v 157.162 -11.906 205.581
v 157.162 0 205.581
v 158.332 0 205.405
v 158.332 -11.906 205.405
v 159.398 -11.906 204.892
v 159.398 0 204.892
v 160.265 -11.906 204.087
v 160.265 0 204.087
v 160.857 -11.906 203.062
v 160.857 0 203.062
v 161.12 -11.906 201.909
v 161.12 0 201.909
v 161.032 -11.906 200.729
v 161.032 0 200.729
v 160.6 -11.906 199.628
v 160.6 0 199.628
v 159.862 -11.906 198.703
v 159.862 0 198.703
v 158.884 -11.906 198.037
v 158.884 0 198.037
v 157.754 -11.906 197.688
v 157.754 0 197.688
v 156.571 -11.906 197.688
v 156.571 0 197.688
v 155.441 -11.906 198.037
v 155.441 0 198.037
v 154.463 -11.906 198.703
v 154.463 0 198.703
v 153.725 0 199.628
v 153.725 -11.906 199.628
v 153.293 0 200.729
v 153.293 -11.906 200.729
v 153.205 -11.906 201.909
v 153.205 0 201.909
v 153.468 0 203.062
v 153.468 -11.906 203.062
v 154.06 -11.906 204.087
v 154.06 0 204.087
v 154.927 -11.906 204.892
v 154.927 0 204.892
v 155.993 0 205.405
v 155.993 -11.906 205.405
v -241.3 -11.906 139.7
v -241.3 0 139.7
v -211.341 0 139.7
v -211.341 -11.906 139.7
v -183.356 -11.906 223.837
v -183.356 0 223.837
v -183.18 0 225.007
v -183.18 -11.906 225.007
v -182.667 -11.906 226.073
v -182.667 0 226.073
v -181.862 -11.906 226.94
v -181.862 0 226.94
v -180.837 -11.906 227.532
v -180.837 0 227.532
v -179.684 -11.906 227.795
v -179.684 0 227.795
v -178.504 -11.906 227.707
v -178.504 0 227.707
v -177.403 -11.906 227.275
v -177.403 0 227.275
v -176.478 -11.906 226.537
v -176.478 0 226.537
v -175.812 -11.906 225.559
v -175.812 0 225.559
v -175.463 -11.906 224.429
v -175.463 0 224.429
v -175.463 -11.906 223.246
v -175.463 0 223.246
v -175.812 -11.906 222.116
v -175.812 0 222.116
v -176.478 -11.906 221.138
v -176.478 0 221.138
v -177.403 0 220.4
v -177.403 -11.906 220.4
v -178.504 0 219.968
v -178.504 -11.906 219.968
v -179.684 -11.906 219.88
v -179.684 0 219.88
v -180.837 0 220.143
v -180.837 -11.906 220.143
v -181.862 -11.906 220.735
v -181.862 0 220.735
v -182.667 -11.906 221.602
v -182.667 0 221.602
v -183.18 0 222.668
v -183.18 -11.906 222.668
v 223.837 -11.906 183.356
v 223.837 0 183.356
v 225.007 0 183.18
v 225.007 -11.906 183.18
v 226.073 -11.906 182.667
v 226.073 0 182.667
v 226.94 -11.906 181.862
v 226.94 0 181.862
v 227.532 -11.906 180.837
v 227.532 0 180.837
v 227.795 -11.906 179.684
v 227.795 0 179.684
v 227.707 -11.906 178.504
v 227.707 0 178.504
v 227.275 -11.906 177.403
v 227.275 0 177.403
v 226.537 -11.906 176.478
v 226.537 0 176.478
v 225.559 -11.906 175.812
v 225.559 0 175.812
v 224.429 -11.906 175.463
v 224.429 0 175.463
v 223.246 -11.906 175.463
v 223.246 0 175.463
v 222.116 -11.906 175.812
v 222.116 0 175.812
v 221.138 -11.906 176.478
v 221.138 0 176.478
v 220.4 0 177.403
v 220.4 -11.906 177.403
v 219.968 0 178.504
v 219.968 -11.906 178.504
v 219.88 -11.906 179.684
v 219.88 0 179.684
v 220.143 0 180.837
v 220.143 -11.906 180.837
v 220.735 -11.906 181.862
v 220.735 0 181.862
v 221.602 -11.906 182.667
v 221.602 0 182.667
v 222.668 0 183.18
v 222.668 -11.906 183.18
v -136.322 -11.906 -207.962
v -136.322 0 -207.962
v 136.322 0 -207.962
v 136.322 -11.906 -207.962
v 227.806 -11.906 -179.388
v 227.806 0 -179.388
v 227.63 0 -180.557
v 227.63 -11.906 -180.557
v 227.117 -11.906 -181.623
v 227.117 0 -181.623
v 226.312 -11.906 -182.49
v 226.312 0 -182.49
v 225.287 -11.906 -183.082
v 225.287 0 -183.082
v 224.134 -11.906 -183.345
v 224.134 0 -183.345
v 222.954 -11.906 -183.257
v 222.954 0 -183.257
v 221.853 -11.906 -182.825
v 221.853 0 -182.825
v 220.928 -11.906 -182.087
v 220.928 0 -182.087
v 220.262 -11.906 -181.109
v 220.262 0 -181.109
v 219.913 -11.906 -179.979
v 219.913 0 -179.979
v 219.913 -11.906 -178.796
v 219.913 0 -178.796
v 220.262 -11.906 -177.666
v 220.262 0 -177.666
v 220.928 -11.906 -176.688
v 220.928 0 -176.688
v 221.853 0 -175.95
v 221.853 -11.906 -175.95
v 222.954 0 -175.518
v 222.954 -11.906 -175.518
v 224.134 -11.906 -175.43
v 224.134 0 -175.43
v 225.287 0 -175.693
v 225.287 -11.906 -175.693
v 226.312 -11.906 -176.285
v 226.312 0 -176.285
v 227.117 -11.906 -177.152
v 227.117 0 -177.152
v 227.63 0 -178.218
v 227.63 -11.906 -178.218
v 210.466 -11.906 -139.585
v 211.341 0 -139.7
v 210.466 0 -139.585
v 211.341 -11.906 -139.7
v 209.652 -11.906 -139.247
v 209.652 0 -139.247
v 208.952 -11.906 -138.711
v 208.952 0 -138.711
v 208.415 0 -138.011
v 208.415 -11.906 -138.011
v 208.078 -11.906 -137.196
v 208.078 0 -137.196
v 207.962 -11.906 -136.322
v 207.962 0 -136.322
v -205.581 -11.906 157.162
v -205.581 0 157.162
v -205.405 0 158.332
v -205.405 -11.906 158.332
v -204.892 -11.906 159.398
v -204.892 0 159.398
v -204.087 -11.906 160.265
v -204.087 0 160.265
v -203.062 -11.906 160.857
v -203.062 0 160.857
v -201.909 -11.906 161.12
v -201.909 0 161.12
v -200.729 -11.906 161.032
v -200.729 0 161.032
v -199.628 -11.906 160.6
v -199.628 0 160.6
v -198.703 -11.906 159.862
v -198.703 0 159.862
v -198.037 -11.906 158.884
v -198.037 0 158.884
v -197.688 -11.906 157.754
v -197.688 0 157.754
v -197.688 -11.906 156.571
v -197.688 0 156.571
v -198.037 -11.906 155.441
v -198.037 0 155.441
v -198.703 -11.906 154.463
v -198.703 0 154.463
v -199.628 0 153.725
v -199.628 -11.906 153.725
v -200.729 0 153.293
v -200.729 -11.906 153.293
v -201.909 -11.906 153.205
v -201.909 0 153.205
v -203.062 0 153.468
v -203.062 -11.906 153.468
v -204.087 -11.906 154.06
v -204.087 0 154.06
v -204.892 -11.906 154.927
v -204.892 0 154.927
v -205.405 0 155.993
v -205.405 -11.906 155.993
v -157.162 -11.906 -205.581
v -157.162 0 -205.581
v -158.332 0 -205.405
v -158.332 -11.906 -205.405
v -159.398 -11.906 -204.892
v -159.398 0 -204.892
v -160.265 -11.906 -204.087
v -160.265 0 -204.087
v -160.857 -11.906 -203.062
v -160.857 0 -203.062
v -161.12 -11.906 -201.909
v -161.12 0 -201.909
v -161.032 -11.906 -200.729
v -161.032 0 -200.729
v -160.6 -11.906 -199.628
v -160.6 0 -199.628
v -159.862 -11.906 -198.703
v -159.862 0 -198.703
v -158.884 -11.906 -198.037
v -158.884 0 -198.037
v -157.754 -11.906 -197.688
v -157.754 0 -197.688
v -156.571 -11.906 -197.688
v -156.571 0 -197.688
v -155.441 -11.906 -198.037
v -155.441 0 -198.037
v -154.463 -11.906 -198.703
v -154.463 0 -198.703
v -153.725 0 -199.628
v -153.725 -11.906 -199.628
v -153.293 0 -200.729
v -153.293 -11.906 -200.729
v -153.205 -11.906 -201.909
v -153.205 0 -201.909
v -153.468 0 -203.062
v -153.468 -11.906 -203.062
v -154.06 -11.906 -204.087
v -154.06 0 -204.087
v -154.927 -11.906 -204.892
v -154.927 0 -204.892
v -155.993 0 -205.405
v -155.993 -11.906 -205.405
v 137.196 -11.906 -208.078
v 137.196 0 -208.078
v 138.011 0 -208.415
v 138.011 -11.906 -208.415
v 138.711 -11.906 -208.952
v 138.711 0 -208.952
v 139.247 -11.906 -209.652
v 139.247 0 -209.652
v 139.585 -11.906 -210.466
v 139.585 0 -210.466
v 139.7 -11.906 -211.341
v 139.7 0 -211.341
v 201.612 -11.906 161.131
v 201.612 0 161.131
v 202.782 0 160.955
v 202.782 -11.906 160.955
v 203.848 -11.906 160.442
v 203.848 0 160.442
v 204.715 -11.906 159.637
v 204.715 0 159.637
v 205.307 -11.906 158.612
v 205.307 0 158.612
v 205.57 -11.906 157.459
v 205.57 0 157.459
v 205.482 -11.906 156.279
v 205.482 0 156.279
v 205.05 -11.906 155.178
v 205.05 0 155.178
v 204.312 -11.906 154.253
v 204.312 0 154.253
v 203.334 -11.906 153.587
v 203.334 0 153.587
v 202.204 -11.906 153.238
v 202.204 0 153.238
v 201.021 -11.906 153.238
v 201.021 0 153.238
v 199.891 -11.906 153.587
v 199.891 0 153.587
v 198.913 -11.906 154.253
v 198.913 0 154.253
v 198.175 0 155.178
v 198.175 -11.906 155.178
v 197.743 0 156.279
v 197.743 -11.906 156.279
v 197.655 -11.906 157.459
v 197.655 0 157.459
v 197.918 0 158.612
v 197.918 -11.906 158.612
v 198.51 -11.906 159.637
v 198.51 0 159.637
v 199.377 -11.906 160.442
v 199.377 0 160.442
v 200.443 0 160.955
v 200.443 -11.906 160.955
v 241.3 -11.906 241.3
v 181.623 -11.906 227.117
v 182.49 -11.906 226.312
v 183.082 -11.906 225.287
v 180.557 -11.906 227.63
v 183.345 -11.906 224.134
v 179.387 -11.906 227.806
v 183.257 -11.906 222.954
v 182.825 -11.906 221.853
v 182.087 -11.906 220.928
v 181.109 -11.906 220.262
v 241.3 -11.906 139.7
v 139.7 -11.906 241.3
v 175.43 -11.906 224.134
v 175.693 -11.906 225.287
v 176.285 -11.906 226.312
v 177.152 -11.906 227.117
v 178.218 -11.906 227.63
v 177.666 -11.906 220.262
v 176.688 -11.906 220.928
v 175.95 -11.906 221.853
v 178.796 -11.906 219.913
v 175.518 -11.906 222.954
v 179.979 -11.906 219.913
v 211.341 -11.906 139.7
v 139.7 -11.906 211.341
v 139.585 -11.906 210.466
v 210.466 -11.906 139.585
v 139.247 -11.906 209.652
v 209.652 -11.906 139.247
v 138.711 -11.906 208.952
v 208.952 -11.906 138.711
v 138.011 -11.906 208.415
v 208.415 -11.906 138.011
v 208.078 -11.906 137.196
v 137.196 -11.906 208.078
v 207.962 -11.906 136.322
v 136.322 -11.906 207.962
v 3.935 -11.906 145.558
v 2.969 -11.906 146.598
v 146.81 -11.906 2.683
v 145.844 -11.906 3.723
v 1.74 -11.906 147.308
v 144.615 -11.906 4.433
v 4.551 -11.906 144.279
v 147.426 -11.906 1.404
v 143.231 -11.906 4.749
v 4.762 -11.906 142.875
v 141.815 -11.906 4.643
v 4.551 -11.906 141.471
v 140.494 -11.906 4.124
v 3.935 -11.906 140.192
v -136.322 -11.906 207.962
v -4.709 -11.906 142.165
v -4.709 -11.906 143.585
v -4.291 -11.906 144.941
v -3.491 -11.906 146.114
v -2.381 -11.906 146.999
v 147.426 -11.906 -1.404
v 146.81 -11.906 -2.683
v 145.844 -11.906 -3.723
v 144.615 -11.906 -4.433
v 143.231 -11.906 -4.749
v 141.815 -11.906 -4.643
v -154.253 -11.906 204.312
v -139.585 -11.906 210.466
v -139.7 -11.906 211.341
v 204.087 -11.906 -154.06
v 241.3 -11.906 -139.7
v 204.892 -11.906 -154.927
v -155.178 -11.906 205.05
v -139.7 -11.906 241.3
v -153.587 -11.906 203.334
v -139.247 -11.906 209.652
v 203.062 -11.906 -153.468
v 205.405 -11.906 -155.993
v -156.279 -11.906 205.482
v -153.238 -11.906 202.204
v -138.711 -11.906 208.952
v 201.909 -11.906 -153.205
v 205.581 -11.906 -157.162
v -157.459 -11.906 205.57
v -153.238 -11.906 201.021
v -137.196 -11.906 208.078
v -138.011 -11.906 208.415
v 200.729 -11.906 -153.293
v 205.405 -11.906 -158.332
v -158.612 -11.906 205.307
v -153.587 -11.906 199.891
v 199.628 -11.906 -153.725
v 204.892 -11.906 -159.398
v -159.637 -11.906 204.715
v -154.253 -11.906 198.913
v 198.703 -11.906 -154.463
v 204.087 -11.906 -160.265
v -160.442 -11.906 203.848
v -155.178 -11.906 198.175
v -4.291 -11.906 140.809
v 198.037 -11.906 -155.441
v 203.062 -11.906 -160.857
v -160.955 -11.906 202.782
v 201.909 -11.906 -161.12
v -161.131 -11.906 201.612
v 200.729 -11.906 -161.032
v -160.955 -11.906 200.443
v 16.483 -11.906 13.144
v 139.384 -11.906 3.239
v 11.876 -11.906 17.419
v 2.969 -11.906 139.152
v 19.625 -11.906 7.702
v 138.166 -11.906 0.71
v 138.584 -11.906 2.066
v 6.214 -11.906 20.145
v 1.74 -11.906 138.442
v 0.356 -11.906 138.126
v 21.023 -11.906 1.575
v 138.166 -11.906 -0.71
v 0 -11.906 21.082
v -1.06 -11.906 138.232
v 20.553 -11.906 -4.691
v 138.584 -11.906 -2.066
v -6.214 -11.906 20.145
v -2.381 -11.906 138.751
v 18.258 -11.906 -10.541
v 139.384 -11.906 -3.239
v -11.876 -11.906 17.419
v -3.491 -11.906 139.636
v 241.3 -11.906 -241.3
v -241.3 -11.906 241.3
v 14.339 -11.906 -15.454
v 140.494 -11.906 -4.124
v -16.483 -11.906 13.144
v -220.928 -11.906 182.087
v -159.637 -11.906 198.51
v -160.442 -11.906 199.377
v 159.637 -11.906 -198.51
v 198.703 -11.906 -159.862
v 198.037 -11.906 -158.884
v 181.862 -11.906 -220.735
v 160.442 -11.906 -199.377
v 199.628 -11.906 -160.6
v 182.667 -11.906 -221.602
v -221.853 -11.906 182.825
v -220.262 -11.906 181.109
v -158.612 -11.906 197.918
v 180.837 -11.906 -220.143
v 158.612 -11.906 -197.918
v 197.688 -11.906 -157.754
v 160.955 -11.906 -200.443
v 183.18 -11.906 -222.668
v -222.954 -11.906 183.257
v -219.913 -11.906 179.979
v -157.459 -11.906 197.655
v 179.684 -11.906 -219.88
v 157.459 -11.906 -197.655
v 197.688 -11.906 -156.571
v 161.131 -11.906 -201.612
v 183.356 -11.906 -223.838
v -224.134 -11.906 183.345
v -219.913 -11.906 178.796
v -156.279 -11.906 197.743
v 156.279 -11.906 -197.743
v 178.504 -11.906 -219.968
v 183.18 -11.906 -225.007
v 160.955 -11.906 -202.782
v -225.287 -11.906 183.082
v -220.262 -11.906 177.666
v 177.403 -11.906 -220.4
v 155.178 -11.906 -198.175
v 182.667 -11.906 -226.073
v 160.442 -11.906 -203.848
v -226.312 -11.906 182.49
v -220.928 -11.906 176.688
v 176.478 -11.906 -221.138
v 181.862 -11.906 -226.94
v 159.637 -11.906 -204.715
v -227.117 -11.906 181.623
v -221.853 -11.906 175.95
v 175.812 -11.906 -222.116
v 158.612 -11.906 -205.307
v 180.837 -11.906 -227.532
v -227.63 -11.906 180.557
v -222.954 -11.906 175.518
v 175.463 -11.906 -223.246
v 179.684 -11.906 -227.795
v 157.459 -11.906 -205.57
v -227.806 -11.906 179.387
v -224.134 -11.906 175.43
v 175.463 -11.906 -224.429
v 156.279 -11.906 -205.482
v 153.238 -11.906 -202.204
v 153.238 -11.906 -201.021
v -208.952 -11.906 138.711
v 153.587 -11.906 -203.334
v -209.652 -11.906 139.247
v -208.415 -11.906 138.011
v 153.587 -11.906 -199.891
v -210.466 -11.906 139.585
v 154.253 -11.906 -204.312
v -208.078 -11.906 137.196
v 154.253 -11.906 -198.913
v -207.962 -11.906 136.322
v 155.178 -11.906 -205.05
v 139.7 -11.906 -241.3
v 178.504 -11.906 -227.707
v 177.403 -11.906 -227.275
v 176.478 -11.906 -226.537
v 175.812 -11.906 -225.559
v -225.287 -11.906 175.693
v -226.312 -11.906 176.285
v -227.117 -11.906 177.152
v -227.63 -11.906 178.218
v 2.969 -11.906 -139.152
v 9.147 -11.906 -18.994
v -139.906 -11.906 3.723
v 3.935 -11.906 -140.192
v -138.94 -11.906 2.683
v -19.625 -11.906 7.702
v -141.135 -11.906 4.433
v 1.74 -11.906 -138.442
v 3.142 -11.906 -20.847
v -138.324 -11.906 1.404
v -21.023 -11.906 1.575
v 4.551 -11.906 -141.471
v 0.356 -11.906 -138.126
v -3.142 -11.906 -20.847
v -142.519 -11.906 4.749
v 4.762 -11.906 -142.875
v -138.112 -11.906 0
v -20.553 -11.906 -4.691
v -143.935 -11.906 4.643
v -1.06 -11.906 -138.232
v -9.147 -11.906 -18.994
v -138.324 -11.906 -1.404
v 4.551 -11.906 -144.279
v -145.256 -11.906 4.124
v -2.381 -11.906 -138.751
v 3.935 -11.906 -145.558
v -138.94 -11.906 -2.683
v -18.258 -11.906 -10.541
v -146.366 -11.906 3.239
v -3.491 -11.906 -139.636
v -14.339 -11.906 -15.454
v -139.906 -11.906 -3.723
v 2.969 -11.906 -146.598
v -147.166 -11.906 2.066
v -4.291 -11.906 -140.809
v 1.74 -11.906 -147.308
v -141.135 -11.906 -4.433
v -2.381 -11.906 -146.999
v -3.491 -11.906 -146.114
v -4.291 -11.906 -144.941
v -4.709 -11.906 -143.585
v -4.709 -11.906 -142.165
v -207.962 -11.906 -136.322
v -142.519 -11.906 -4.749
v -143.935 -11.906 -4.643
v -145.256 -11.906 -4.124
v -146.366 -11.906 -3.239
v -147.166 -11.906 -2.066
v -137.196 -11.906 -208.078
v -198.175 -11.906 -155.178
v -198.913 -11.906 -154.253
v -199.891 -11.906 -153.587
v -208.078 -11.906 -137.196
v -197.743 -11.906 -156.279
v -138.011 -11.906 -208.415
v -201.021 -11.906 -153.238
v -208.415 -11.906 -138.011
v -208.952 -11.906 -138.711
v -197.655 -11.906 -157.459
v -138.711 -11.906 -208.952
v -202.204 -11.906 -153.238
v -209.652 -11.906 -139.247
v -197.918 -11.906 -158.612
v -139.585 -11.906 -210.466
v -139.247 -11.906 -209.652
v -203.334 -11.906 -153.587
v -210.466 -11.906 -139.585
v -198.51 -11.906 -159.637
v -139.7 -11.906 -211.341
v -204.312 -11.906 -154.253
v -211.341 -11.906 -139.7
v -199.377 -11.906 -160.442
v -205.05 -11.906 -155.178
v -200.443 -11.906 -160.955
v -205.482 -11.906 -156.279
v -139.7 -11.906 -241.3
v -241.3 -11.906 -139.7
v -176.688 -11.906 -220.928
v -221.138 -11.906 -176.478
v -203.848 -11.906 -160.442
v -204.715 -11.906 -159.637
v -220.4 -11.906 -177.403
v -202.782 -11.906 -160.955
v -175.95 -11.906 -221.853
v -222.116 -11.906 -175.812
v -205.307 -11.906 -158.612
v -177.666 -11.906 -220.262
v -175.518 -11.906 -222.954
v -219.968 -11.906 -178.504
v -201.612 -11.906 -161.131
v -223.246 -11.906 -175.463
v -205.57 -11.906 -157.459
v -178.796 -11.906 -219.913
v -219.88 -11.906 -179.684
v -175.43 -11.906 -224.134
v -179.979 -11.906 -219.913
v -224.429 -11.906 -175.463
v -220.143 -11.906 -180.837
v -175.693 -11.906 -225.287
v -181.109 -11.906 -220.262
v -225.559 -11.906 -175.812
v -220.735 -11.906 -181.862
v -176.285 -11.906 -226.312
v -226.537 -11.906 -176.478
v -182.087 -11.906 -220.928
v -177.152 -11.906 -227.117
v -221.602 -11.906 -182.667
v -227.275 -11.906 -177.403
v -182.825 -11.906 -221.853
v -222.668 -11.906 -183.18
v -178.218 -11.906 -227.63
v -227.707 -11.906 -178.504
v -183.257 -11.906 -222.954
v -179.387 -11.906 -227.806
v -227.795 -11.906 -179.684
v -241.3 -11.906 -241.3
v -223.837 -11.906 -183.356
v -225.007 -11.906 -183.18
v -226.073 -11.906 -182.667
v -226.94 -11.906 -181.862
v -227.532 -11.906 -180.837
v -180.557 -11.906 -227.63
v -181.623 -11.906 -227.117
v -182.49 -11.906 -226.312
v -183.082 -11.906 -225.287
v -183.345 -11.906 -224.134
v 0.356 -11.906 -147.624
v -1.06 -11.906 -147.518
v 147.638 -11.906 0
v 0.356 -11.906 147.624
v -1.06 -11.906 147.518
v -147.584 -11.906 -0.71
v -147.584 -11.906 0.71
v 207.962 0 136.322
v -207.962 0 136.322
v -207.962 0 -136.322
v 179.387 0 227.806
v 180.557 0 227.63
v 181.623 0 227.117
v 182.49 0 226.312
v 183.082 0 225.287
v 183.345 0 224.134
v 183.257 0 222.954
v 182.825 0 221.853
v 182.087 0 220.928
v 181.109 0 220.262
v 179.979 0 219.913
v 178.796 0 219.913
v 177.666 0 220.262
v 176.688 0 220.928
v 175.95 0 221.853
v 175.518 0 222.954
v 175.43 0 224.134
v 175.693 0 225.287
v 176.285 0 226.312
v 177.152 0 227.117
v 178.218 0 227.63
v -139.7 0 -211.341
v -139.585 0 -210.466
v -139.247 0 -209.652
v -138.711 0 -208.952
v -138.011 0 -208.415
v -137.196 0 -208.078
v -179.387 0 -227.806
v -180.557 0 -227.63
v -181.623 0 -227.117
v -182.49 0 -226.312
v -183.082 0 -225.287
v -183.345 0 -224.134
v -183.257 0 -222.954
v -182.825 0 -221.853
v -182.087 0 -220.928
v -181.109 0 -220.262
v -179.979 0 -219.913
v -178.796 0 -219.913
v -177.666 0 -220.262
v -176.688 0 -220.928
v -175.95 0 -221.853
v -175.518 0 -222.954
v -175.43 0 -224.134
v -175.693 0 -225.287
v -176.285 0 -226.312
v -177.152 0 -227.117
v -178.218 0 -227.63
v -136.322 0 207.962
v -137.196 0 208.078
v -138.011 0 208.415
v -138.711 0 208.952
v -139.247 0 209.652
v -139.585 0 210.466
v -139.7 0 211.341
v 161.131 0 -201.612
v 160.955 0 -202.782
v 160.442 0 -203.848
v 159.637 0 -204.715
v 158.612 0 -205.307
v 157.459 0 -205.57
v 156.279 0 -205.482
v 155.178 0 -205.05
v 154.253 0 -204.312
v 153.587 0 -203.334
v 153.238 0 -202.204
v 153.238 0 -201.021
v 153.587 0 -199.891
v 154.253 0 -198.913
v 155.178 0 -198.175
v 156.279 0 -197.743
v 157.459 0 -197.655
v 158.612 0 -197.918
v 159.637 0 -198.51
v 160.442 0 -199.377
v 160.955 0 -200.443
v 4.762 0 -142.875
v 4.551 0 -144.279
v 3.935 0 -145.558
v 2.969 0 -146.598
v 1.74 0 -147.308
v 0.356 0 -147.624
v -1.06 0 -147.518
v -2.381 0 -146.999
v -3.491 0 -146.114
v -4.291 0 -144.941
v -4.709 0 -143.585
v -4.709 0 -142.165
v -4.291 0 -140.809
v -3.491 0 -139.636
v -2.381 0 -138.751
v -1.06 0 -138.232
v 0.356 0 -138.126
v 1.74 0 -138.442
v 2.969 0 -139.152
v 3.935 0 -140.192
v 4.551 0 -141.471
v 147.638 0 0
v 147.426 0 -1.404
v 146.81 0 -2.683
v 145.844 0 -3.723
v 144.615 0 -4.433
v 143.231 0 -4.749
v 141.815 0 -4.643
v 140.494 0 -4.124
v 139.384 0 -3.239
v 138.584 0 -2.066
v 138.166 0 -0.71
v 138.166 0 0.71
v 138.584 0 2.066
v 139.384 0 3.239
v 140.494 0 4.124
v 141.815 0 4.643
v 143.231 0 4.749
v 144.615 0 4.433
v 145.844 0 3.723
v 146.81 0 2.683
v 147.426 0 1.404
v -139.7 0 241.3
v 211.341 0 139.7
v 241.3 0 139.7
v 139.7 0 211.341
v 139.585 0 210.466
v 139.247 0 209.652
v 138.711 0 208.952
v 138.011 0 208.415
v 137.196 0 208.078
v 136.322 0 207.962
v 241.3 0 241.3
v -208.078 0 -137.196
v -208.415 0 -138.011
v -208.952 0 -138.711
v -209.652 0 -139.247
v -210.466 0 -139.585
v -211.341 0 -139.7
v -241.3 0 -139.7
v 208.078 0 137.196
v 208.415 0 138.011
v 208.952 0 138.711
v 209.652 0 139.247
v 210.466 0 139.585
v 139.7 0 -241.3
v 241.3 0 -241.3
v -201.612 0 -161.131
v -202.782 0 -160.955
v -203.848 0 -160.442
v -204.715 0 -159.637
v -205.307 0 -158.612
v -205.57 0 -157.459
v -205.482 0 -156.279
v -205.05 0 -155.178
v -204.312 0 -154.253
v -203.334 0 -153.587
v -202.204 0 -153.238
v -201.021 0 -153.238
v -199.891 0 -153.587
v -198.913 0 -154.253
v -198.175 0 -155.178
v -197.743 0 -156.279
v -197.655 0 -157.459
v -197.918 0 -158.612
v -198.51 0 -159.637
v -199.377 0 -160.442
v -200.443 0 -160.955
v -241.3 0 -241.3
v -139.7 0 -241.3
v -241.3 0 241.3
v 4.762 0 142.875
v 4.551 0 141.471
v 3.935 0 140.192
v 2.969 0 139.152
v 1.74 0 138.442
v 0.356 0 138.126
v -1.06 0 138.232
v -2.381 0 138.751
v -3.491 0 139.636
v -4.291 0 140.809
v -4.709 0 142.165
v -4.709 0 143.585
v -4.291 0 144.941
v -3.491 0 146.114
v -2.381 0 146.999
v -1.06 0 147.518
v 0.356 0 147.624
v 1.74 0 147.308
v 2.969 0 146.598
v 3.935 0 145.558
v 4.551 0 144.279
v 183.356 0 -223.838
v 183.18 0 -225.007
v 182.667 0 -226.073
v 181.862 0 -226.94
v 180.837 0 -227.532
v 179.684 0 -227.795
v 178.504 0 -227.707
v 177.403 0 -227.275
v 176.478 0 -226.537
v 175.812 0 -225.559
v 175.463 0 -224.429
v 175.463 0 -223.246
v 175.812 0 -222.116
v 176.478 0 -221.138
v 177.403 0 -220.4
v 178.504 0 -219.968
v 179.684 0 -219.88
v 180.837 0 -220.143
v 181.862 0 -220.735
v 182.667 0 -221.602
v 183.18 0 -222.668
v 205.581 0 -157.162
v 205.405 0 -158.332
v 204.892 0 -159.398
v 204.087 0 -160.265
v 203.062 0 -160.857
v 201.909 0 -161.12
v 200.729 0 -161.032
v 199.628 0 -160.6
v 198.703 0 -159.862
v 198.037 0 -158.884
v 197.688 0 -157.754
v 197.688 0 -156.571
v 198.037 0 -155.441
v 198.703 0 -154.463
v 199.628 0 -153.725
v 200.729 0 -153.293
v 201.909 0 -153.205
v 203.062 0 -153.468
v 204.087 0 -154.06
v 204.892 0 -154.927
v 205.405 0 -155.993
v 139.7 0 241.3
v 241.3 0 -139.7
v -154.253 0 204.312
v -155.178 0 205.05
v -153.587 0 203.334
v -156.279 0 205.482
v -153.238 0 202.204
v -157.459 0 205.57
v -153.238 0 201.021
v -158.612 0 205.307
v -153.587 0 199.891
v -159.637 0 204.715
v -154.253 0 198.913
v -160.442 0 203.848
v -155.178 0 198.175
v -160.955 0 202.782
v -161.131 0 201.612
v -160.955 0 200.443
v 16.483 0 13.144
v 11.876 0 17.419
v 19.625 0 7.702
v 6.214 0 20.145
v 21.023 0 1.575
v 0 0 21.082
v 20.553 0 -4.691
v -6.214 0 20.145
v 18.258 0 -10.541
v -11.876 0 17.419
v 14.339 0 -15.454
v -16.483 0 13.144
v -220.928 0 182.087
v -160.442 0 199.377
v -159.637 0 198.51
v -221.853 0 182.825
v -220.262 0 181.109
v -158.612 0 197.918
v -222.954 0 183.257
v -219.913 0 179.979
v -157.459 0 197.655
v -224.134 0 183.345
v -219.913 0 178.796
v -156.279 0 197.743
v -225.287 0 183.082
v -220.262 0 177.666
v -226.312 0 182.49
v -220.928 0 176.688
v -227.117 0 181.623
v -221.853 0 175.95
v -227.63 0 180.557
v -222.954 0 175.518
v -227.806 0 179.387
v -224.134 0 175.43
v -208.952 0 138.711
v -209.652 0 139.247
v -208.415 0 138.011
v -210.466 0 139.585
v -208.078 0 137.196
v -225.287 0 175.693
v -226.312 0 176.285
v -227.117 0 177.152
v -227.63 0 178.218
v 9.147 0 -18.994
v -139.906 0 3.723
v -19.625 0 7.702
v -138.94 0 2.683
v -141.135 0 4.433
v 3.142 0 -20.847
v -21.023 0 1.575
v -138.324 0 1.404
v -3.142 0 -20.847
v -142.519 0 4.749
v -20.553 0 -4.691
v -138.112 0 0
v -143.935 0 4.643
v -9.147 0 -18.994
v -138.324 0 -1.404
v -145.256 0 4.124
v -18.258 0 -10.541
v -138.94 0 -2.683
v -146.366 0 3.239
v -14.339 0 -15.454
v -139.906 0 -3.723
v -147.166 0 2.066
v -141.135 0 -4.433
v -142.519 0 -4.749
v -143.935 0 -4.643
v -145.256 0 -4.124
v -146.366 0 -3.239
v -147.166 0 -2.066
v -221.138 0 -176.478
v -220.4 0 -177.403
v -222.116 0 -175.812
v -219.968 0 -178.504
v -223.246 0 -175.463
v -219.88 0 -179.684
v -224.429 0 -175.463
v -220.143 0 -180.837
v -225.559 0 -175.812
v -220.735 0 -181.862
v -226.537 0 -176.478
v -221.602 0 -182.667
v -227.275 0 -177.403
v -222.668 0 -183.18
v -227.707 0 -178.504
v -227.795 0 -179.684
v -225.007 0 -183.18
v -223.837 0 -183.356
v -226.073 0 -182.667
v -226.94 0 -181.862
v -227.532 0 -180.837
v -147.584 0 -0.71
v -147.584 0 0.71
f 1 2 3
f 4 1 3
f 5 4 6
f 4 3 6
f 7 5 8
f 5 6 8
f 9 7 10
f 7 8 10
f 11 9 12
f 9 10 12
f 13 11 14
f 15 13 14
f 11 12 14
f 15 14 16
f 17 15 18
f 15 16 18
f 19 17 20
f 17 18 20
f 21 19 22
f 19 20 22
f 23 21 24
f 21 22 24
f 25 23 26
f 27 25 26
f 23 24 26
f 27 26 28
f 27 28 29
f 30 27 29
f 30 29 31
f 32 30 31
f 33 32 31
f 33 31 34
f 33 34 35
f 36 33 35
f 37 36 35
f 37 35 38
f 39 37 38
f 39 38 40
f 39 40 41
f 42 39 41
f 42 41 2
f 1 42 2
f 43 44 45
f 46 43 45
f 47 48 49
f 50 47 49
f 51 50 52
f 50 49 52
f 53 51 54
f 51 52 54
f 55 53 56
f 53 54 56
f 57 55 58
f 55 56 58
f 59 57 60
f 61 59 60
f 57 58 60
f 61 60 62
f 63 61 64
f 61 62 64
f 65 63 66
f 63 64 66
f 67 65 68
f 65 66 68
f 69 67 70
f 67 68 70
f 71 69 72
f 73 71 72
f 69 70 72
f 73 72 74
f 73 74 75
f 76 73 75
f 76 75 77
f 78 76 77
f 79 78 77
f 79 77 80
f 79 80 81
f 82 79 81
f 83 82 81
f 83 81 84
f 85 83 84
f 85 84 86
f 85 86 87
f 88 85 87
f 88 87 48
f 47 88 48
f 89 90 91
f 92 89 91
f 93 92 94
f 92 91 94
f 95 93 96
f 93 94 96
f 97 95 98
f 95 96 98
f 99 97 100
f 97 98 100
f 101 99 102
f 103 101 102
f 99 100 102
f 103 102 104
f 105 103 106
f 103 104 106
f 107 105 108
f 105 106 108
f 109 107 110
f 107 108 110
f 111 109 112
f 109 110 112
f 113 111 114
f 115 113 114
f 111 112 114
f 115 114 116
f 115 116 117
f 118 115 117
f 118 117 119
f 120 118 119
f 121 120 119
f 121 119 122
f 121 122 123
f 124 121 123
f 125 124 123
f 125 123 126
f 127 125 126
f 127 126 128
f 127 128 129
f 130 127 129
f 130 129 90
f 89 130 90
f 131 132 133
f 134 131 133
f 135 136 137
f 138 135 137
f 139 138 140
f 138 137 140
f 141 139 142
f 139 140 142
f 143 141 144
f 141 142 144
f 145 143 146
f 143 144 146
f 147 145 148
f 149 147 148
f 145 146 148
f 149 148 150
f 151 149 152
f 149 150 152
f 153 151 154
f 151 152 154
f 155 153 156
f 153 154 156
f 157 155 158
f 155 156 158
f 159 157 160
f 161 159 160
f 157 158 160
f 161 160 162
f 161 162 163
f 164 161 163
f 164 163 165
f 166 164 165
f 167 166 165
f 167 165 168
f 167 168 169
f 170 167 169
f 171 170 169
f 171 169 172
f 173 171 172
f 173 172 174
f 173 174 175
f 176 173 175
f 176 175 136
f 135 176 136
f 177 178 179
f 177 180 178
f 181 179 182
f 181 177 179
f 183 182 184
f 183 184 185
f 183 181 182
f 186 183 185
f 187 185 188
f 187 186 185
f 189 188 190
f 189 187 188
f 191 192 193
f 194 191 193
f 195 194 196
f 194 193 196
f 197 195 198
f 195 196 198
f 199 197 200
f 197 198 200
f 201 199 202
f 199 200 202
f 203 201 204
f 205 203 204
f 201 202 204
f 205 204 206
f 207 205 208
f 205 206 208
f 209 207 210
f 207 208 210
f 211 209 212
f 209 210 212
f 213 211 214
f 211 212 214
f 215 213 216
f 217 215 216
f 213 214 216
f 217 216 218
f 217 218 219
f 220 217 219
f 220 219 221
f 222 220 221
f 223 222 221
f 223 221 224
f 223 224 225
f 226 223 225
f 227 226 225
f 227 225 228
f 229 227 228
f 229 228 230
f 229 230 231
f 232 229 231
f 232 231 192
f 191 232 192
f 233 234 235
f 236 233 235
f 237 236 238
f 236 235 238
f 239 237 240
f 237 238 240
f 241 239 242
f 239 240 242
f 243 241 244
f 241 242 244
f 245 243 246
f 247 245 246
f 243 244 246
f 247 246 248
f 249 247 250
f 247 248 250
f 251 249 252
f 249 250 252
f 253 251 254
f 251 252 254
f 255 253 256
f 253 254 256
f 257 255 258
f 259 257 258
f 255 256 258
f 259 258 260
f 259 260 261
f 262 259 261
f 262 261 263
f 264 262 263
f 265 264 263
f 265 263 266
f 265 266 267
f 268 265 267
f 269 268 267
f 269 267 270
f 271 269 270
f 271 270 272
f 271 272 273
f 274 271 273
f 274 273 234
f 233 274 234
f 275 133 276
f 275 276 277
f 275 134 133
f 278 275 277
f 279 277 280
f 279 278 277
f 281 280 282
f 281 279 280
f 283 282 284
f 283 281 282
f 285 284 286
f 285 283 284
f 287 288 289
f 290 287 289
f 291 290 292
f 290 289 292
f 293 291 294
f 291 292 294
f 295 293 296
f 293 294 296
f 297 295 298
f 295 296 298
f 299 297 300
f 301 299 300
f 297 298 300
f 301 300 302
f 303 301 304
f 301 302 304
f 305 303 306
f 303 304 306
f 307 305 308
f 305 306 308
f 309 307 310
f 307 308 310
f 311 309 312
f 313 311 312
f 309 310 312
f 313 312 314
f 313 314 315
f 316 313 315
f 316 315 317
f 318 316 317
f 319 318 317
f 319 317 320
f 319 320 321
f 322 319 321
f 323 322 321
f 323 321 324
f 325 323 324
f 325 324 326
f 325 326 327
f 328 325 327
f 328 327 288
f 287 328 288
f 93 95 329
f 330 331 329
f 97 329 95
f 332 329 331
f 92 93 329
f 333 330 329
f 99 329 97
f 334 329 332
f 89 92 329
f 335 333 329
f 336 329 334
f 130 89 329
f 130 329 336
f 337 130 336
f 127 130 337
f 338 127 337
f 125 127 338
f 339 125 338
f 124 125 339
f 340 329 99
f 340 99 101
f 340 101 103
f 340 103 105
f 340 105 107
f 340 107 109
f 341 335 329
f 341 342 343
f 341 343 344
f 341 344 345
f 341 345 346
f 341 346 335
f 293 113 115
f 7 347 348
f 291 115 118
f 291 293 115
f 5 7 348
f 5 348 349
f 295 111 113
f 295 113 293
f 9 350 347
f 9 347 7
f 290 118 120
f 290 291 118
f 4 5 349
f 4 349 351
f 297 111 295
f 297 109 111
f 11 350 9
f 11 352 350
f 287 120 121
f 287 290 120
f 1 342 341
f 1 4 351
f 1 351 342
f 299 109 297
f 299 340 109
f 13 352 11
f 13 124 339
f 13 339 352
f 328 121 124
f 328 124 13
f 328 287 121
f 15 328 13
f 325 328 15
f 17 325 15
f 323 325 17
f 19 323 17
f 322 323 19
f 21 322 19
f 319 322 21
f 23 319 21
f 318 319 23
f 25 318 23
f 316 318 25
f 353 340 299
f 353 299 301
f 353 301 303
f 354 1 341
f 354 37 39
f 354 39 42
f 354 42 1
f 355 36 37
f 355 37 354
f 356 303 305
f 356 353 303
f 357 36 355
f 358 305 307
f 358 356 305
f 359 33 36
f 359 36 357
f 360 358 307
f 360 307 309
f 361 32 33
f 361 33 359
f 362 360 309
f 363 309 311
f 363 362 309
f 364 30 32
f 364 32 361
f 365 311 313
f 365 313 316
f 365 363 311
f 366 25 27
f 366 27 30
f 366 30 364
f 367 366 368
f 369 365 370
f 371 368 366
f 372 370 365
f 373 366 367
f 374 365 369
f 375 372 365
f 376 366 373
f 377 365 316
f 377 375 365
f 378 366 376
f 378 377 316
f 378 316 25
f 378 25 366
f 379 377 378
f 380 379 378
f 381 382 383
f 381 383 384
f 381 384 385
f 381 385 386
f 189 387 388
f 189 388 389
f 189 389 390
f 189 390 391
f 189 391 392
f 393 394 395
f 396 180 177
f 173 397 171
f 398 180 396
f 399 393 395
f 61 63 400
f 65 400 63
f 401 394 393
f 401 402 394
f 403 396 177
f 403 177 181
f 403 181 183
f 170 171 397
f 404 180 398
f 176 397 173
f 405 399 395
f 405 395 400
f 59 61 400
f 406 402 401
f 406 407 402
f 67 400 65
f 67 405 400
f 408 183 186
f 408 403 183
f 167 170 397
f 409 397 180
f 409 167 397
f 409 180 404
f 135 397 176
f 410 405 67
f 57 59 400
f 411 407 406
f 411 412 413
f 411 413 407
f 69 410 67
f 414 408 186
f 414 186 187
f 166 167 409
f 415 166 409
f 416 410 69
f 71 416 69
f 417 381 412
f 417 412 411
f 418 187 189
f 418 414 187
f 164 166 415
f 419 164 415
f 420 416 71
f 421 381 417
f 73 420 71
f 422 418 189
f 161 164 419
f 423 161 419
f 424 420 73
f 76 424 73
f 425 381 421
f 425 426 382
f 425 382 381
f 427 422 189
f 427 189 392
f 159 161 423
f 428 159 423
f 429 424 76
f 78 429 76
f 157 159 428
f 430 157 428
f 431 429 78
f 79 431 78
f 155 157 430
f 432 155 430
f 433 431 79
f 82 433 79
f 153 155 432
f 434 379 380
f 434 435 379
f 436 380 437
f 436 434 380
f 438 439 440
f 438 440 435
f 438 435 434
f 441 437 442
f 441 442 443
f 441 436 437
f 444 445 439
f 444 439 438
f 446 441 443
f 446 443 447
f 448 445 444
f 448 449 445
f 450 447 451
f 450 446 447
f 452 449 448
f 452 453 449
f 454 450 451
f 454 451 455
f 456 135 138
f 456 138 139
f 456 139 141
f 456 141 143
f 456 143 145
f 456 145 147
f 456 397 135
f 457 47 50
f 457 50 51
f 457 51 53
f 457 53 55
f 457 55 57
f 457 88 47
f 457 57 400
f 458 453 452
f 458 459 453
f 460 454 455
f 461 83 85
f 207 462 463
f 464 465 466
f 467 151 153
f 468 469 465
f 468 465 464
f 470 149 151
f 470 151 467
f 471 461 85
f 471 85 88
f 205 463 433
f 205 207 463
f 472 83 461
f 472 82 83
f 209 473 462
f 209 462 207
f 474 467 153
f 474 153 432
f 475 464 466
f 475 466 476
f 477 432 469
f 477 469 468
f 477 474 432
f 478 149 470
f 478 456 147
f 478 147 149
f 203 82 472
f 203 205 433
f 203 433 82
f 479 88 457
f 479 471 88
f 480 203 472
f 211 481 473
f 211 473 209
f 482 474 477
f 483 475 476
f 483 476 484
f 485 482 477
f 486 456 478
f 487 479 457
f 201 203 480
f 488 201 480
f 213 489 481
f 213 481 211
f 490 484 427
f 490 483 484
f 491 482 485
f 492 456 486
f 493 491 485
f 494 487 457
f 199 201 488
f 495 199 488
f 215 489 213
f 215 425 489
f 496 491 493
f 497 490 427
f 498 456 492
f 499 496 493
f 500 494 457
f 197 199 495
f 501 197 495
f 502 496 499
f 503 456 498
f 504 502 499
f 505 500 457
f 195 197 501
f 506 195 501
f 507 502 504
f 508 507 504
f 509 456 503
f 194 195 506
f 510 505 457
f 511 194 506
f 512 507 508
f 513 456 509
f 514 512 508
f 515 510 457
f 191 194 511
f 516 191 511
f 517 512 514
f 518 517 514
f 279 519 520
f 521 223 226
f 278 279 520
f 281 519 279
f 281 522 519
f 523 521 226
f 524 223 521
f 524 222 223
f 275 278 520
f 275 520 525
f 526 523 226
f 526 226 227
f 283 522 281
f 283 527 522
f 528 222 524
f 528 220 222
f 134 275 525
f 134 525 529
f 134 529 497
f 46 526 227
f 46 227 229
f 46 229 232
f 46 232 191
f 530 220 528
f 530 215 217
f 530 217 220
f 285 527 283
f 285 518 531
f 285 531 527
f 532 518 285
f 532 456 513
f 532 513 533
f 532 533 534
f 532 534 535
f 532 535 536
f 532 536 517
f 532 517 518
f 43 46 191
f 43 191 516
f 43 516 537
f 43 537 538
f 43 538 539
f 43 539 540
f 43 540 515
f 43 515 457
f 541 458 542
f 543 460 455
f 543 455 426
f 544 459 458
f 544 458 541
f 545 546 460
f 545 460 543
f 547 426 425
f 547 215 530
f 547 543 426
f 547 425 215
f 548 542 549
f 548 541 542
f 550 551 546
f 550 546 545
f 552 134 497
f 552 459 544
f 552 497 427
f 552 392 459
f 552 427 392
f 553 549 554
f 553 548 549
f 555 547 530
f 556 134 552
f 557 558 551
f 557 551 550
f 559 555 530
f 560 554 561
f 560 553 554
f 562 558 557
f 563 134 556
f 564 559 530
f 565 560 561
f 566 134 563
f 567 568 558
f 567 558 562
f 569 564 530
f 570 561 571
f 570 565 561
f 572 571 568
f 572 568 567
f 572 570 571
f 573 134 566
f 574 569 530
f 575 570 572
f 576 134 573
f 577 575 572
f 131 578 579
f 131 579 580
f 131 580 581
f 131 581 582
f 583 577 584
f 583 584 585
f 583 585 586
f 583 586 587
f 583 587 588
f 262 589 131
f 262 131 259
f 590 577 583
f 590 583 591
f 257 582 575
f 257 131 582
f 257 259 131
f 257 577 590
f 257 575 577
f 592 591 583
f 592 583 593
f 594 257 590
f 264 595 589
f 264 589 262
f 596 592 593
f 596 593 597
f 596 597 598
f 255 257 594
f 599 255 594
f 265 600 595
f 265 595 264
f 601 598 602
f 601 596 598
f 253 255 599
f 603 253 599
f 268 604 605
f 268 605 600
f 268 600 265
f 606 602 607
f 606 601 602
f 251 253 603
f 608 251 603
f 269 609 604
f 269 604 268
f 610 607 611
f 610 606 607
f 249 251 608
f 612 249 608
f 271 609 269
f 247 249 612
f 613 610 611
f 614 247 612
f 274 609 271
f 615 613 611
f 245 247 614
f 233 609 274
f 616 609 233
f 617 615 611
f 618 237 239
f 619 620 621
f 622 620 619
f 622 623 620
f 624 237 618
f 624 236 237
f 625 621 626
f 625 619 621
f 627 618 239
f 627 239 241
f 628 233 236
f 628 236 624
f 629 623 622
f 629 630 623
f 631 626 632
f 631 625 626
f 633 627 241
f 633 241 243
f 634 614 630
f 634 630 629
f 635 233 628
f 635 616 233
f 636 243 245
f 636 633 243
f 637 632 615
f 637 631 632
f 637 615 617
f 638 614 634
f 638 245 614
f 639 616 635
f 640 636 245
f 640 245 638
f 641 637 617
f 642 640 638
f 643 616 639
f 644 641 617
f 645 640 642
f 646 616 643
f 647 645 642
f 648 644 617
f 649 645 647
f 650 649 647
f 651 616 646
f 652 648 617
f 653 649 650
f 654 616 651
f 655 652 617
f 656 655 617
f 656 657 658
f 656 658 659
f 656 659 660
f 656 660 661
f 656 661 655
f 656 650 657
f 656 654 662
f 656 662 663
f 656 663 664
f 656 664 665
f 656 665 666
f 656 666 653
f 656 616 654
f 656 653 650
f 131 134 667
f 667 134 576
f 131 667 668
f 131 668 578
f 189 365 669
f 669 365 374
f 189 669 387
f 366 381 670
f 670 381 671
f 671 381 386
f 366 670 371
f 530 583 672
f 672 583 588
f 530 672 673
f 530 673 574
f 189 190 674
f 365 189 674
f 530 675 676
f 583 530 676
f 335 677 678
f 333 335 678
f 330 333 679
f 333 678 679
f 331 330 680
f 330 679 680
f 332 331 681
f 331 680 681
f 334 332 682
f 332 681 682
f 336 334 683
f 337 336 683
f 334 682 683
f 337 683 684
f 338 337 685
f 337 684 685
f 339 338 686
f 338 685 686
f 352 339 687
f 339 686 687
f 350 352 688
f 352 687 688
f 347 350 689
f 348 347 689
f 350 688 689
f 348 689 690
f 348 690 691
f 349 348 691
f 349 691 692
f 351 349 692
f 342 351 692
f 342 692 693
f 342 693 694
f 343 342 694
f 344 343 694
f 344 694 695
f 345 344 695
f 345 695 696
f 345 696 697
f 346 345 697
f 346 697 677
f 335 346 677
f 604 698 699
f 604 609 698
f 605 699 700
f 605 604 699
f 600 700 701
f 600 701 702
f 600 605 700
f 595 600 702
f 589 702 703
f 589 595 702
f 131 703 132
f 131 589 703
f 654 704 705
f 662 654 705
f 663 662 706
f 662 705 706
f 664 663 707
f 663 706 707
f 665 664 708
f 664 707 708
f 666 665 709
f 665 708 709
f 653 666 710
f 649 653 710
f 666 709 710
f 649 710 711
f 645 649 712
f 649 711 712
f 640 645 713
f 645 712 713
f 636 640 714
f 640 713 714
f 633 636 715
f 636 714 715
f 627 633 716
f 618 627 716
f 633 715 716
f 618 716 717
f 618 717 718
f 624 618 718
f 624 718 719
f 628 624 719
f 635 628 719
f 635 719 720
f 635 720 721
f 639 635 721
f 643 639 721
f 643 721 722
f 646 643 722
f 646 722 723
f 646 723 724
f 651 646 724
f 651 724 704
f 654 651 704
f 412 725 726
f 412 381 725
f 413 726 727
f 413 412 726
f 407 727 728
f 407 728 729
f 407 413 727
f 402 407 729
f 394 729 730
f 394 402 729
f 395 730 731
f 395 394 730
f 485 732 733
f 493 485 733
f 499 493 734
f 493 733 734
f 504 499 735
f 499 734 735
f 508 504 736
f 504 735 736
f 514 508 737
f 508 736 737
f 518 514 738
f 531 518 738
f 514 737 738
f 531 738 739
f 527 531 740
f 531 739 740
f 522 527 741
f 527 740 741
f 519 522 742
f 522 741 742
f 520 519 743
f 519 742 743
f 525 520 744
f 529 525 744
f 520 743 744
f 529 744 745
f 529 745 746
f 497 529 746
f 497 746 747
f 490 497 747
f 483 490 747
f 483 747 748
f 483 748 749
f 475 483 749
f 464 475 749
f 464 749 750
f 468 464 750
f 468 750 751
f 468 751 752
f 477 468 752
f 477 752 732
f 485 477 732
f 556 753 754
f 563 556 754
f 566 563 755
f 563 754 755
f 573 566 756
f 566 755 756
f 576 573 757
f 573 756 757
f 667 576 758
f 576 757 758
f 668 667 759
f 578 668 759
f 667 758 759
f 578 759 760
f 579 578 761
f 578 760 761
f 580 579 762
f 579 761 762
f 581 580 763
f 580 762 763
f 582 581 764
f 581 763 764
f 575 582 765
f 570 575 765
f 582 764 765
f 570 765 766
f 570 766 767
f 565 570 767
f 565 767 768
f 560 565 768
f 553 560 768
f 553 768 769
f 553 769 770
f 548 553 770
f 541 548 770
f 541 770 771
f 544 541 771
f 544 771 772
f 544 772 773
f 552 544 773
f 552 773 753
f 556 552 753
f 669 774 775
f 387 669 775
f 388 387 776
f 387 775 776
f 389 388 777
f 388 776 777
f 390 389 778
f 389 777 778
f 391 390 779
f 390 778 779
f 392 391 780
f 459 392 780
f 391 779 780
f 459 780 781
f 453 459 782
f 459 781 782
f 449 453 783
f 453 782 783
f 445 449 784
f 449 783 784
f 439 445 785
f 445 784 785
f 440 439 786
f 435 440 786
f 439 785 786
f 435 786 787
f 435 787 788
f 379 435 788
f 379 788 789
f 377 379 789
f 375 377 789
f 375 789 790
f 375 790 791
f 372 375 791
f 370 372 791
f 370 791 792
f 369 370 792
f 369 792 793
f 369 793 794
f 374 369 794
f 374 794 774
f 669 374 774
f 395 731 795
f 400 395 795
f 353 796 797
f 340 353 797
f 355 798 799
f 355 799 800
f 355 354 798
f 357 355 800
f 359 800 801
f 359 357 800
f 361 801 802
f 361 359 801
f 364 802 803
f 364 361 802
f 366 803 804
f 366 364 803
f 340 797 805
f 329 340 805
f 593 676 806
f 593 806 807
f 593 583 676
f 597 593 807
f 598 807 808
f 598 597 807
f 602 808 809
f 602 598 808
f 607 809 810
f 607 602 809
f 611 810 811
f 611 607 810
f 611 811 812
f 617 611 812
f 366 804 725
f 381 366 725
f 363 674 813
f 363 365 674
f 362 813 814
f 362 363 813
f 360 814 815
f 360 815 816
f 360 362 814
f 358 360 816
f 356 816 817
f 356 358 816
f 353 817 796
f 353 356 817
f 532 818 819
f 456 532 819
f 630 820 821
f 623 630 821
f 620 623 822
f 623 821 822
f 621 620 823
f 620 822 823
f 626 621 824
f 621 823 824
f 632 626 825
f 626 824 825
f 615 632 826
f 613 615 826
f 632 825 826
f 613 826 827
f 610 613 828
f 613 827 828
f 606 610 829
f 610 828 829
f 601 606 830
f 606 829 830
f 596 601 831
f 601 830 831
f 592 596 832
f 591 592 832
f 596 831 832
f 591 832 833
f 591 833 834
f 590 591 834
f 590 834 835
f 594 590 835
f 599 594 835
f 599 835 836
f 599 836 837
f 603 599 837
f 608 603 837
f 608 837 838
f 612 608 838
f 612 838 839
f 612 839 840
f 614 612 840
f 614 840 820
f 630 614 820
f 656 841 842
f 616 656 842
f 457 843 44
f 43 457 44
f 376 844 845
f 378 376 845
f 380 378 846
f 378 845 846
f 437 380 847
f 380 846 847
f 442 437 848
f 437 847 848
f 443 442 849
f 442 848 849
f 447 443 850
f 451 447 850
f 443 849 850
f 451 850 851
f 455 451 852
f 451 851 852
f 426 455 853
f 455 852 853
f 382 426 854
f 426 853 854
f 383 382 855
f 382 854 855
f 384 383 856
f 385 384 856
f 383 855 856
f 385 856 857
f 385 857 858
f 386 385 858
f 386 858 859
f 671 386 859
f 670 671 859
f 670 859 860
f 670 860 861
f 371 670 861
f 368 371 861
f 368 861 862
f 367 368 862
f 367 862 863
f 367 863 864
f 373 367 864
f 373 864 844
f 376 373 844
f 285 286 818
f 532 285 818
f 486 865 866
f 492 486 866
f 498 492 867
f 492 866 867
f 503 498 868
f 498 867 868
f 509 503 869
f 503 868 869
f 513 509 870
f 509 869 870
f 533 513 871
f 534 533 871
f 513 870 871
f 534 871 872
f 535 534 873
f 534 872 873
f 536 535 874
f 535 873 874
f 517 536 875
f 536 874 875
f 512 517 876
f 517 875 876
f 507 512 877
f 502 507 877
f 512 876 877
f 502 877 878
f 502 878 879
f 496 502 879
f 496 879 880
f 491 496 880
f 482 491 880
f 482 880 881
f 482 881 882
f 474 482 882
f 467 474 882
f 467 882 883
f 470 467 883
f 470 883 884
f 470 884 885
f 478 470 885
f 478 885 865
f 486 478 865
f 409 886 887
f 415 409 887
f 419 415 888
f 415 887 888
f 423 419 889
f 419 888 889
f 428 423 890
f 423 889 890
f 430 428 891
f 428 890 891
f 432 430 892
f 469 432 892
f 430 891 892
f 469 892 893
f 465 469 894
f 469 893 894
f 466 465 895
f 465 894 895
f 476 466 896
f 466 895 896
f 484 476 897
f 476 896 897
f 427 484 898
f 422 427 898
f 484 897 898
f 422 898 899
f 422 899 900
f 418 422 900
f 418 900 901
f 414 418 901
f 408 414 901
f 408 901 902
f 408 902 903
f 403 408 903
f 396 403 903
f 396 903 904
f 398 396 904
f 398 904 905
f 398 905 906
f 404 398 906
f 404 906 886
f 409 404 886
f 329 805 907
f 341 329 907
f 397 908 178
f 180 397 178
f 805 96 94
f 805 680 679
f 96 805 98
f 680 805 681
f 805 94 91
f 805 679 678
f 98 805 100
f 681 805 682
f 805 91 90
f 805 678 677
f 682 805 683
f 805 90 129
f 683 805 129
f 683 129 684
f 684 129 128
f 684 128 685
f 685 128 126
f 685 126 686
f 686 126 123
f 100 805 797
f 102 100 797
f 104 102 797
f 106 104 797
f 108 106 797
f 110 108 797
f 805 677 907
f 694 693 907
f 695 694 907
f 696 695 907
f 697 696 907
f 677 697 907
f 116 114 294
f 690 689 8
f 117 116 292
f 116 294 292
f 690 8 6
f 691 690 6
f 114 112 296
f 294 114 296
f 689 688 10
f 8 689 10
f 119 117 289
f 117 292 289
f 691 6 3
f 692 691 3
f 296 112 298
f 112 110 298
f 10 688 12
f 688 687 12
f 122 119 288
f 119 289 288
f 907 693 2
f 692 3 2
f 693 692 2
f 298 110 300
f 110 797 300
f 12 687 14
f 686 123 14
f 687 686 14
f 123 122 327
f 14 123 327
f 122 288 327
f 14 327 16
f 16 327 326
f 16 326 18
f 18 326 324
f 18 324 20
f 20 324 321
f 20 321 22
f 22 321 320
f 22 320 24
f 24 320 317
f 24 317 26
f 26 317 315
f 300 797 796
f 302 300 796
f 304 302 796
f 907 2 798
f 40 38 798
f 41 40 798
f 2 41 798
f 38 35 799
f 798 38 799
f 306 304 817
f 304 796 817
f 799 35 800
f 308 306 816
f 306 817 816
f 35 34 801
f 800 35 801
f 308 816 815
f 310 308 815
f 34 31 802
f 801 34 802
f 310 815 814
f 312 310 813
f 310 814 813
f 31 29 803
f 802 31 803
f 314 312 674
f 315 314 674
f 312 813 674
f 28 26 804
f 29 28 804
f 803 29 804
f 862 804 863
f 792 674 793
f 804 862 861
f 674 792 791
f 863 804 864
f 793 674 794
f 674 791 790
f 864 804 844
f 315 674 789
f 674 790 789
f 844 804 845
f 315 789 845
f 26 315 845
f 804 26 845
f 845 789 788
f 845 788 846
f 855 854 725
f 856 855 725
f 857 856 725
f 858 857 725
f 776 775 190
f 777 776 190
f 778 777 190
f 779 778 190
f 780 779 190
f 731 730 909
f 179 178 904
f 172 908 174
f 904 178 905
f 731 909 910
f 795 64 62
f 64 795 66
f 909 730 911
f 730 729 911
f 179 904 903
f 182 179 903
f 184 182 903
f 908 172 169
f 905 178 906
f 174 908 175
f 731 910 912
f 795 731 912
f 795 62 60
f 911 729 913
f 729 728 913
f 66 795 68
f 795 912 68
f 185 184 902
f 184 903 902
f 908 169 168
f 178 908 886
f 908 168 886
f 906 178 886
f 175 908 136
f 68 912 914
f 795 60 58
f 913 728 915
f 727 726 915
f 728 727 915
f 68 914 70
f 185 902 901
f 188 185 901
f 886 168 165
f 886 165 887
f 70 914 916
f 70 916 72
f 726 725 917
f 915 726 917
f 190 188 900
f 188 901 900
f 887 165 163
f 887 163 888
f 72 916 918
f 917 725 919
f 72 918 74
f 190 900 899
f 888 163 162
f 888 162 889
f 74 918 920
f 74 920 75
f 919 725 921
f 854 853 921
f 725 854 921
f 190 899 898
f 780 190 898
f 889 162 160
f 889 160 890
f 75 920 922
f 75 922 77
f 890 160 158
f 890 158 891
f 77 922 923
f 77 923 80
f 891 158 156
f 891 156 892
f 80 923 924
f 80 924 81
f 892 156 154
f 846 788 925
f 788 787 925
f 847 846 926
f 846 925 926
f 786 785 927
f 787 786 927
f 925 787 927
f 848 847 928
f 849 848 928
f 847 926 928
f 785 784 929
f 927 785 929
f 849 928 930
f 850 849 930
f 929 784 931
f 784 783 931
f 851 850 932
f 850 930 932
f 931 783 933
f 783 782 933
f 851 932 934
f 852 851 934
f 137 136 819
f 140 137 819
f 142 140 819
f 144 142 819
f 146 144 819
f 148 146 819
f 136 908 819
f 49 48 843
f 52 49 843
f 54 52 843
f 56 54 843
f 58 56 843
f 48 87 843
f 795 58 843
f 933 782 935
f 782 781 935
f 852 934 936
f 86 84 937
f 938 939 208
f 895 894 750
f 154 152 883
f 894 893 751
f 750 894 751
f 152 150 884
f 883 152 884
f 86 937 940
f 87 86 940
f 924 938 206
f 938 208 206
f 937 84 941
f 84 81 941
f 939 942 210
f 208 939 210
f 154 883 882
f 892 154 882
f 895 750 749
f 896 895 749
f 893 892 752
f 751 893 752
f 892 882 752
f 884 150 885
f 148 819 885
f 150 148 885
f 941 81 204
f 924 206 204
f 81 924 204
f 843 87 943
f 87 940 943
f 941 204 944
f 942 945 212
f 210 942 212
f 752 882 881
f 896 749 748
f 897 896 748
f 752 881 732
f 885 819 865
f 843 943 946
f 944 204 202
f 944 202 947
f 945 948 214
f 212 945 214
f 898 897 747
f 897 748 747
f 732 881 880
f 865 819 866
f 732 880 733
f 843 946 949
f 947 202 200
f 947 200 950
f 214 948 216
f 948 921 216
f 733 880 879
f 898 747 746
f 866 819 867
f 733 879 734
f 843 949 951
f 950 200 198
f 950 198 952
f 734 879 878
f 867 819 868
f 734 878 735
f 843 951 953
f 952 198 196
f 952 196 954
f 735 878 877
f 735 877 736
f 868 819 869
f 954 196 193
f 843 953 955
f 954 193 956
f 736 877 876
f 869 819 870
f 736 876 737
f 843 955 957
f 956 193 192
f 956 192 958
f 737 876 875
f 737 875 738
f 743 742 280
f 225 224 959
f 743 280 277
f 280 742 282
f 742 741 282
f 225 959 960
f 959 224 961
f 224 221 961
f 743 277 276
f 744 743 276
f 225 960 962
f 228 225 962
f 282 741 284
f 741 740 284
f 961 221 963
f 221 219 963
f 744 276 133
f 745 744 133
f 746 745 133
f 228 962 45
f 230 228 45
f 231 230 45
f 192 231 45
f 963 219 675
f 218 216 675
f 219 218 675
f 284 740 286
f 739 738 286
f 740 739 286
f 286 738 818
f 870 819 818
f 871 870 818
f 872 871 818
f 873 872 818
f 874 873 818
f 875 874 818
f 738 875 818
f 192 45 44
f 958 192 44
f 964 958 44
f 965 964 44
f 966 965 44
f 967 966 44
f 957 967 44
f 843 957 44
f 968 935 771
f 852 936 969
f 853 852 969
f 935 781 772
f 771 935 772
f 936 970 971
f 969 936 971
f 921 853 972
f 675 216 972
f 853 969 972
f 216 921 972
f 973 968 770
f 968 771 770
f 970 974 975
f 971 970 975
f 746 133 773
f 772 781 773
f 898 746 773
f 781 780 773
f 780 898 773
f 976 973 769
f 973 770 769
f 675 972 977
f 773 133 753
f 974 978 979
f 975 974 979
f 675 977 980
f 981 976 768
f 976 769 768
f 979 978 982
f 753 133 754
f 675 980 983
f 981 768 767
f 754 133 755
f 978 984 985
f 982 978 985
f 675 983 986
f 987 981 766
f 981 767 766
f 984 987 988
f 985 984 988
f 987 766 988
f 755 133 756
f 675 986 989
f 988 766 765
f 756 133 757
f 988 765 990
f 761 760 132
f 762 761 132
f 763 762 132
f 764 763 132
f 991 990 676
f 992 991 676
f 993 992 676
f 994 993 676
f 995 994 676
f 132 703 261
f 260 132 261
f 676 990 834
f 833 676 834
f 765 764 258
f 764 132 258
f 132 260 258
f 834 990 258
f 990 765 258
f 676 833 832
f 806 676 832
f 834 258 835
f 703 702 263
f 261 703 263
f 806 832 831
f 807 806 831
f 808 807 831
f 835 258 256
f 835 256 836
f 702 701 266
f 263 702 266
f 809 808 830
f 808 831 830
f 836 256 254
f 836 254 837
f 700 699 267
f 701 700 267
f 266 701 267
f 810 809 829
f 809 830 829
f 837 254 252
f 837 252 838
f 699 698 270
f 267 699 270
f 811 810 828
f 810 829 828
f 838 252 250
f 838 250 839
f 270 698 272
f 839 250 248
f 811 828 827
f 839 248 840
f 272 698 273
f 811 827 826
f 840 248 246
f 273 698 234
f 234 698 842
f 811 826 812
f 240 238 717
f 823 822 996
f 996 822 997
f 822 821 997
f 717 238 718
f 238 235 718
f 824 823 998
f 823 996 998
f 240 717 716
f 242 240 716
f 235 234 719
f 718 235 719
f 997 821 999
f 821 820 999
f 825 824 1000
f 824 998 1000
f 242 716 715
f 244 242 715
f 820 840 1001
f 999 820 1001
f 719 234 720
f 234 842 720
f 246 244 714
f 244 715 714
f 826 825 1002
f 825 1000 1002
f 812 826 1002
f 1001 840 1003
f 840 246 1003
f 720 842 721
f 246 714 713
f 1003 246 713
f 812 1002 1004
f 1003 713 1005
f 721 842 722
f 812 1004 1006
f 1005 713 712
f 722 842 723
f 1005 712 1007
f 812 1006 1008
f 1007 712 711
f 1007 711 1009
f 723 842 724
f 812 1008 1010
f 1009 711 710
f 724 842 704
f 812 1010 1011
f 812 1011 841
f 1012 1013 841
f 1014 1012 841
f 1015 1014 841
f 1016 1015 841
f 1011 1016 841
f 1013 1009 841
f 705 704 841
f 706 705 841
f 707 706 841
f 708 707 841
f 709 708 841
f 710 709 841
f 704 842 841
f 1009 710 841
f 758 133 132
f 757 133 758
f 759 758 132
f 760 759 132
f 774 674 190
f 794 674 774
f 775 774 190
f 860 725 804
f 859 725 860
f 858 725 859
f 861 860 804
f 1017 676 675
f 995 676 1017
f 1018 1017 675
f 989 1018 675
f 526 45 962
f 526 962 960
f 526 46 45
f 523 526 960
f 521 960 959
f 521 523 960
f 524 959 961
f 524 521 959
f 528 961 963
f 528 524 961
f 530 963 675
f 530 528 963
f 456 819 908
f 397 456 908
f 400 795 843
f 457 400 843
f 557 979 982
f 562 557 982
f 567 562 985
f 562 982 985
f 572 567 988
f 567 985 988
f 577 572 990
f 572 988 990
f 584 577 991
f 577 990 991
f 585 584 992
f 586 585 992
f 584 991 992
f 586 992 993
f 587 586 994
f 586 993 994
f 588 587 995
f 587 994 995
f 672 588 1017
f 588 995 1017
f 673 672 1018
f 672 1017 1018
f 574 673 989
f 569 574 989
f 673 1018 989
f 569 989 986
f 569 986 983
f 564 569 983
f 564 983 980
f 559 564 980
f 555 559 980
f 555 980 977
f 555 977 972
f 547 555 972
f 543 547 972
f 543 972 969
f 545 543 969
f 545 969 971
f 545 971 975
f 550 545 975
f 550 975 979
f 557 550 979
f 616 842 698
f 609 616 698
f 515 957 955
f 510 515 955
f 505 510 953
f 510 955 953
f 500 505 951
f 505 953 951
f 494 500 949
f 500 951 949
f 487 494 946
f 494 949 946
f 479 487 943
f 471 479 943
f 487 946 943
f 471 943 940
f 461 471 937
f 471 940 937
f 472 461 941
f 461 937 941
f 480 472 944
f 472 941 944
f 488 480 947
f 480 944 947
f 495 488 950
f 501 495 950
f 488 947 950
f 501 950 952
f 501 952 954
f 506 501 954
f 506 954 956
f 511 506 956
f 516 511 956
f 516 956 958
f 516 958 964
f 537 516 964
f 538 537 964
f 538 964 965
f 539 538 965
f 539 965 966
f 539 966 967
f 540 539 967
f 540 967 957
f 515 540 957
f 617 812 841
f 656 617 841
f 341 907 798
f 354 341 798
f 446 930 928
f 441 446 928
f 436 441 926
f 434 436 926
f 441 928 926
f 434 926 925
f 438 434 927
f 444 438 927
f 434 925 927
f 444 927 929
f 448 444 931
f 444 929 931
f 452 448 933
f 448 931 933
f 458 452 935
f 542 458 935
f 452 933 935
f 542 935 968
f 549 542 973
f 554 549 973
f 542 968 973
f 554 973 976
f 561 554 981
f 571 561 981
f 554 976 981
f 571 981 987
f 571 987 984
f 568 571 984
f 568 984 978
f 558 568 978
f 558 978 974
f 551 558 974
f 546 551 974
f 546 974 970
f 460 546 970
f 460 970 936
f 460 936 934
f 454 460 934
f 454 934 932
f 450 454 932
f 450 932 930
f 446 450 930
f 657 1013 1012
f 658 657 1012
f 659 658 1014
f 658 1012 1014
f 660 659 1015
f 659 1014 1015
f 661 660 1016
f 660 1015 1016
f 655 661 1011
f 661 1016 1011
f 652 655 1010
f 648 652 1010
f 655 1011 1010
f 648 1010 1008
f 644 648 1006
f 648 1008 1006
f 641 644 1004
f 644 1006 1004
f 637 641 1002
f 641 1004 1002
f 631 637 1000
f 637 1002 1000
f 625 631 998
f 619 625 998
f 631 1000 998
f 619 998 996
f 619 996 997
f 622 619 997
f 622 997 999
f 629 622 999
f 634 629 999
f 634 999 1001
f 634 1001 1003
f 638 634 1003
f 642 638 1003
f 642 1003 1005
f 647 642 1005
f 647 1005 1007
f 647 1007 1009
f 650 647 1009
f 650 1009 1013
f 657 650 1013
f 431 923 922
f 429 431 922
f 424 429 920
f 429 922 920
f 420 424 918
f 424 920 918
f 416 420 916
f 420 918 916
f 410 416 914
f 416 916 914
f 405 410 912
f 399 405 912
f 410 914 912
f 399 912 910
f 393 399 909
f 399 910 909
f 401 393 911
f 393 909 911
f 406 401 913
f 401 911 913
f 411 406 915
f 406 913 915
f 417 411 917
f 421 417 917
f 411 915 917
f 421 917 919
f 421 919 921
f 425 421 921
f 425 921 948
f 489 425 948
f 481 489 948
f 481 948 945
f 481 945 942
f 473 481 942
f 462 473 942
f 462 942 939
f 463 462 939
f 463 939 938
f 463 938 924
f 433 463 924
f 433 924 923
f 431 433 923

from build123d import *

# Parameters (mm, degrees)
BOSS_EXTRUDE1_DEPTH             = 11.90625
FILLET1_R                       = 3.3782
FOR_CONNECTION_TO_DONUT_D       = 9.525
F_5_16_0_3125_DIAMETER_HOLE1_D  = 7.9375
CIRPATTERN1_COUNT               = 4
SKETCH14_R                      = 21.082
HOLE_FOR_WHEEL_ON_A_STICK_DEPTH = 342.457374776


with BuildPart() as part:
    # Sketch2 → Boss-Extrude1 (new body)
    with BuildSketch(Plane(origin=(0, 0, 0), x_dir=(1, 0, 0), z_dir=(0, 1, 0))):
        Polygon((-241.3, 241.3), (-139.7, 241.3), (-139.7, 207.9625), (139.7, 207.9625), (139.7, 241.3), (241.3, 241.3), (241.3, 139.7), (207.9625, 139.7), (207.9625, -139.7), (241.3, -139.7), (241.3, -241.3), (139.7, -241.3), (139.7, -207.9625), (-139.7, -207.9625), (-139.7, -241.3), (-241.3, -241.3), (-241.3, -139.7), (-207.9625, -139.7), (-207.9625, 139.7), (-241.3, 139.7), align=None)
    extrude(amount=-BOSS_EXTRUDE1_DEPTH)

    # Fillet1
    fillet1_edges = [part.edges().sort_by_distance(p)[0] for p in [
        (-139.7, -5.953125, -207.9625),
        (139.7, -5.953125, -207.9625),
        (207.9625, -5.953125, -139.7),
        (207.9625, -5.953125, 139.7),
        (139.7, -5.953125, 207.9625),
        (-139.7, -5.953125, 207.9625),
        (-207.9625, -5.953125, 139.7),
        (-207.9625, -5.953125, -139.7),
    ]]
    fillet(fillet1_edges, radius=FILLET1_R)

    # for connection to donut (through all)
    with Locations(Plane(origin=(0, -11.90625, 0), x_dir=(-1, 0, 0), z_dir=(0, -1, 0))):
        with Locations((0, -142.875), (142.875, 0), (0, 142.875), (-142.875, 0)):
            Hole(FOR_CONNECTION_TO_DONUT_D / 2)

    # 5/16 (0.3125) Diameter Hole1 (through all)
    with Locations(Plane(origin=(0, -11.90625, 0), x_dir=(-1, 0, 0), z_dir=(0, -1, 0))):
        with Locations((-157.1625, 201.6125), (-179.3875, 223.8375), (-223.8375, 179.3875), (-201.6125, 157.1625)):
            f_5_16_0_3125_diameter_hole1 = Hole(F_5_16_0_3125_DIAMETER_HOLE1_D / 2)

    # CirPattern1: 5/16 (0.3125) Diameter Hole1 ×4 about axis
    cirpattern1_axis = Axis((0, 0, 0), (0, 1, 0))
    for i in range(1, CIRPATTERN1_COUNT):
        add(f_5_16_0_3125_diameter_hole1.rotate(cirpattern1_axis, i * 360 / CIRPATTERN1_COUNT), mode=Mode.SUBTRACT)

    # Sketch14 → hole for wheel on a stick (cut, through all)
    with BuildSketch(Plane(origin=(0, 0, 0), x_dir=(1, 0, 0), z_dir=(0, 1, 0))):
        with Locations(Location((0, 0, 0), (0, 0, 270))):
            Circle(SKETCH14_R)
    extrude(amount=-HOLE_FOR_WHEEL_ON_A_STICK_DEPTH, mode=Mode.SUBTRACT)


solid = part.part
